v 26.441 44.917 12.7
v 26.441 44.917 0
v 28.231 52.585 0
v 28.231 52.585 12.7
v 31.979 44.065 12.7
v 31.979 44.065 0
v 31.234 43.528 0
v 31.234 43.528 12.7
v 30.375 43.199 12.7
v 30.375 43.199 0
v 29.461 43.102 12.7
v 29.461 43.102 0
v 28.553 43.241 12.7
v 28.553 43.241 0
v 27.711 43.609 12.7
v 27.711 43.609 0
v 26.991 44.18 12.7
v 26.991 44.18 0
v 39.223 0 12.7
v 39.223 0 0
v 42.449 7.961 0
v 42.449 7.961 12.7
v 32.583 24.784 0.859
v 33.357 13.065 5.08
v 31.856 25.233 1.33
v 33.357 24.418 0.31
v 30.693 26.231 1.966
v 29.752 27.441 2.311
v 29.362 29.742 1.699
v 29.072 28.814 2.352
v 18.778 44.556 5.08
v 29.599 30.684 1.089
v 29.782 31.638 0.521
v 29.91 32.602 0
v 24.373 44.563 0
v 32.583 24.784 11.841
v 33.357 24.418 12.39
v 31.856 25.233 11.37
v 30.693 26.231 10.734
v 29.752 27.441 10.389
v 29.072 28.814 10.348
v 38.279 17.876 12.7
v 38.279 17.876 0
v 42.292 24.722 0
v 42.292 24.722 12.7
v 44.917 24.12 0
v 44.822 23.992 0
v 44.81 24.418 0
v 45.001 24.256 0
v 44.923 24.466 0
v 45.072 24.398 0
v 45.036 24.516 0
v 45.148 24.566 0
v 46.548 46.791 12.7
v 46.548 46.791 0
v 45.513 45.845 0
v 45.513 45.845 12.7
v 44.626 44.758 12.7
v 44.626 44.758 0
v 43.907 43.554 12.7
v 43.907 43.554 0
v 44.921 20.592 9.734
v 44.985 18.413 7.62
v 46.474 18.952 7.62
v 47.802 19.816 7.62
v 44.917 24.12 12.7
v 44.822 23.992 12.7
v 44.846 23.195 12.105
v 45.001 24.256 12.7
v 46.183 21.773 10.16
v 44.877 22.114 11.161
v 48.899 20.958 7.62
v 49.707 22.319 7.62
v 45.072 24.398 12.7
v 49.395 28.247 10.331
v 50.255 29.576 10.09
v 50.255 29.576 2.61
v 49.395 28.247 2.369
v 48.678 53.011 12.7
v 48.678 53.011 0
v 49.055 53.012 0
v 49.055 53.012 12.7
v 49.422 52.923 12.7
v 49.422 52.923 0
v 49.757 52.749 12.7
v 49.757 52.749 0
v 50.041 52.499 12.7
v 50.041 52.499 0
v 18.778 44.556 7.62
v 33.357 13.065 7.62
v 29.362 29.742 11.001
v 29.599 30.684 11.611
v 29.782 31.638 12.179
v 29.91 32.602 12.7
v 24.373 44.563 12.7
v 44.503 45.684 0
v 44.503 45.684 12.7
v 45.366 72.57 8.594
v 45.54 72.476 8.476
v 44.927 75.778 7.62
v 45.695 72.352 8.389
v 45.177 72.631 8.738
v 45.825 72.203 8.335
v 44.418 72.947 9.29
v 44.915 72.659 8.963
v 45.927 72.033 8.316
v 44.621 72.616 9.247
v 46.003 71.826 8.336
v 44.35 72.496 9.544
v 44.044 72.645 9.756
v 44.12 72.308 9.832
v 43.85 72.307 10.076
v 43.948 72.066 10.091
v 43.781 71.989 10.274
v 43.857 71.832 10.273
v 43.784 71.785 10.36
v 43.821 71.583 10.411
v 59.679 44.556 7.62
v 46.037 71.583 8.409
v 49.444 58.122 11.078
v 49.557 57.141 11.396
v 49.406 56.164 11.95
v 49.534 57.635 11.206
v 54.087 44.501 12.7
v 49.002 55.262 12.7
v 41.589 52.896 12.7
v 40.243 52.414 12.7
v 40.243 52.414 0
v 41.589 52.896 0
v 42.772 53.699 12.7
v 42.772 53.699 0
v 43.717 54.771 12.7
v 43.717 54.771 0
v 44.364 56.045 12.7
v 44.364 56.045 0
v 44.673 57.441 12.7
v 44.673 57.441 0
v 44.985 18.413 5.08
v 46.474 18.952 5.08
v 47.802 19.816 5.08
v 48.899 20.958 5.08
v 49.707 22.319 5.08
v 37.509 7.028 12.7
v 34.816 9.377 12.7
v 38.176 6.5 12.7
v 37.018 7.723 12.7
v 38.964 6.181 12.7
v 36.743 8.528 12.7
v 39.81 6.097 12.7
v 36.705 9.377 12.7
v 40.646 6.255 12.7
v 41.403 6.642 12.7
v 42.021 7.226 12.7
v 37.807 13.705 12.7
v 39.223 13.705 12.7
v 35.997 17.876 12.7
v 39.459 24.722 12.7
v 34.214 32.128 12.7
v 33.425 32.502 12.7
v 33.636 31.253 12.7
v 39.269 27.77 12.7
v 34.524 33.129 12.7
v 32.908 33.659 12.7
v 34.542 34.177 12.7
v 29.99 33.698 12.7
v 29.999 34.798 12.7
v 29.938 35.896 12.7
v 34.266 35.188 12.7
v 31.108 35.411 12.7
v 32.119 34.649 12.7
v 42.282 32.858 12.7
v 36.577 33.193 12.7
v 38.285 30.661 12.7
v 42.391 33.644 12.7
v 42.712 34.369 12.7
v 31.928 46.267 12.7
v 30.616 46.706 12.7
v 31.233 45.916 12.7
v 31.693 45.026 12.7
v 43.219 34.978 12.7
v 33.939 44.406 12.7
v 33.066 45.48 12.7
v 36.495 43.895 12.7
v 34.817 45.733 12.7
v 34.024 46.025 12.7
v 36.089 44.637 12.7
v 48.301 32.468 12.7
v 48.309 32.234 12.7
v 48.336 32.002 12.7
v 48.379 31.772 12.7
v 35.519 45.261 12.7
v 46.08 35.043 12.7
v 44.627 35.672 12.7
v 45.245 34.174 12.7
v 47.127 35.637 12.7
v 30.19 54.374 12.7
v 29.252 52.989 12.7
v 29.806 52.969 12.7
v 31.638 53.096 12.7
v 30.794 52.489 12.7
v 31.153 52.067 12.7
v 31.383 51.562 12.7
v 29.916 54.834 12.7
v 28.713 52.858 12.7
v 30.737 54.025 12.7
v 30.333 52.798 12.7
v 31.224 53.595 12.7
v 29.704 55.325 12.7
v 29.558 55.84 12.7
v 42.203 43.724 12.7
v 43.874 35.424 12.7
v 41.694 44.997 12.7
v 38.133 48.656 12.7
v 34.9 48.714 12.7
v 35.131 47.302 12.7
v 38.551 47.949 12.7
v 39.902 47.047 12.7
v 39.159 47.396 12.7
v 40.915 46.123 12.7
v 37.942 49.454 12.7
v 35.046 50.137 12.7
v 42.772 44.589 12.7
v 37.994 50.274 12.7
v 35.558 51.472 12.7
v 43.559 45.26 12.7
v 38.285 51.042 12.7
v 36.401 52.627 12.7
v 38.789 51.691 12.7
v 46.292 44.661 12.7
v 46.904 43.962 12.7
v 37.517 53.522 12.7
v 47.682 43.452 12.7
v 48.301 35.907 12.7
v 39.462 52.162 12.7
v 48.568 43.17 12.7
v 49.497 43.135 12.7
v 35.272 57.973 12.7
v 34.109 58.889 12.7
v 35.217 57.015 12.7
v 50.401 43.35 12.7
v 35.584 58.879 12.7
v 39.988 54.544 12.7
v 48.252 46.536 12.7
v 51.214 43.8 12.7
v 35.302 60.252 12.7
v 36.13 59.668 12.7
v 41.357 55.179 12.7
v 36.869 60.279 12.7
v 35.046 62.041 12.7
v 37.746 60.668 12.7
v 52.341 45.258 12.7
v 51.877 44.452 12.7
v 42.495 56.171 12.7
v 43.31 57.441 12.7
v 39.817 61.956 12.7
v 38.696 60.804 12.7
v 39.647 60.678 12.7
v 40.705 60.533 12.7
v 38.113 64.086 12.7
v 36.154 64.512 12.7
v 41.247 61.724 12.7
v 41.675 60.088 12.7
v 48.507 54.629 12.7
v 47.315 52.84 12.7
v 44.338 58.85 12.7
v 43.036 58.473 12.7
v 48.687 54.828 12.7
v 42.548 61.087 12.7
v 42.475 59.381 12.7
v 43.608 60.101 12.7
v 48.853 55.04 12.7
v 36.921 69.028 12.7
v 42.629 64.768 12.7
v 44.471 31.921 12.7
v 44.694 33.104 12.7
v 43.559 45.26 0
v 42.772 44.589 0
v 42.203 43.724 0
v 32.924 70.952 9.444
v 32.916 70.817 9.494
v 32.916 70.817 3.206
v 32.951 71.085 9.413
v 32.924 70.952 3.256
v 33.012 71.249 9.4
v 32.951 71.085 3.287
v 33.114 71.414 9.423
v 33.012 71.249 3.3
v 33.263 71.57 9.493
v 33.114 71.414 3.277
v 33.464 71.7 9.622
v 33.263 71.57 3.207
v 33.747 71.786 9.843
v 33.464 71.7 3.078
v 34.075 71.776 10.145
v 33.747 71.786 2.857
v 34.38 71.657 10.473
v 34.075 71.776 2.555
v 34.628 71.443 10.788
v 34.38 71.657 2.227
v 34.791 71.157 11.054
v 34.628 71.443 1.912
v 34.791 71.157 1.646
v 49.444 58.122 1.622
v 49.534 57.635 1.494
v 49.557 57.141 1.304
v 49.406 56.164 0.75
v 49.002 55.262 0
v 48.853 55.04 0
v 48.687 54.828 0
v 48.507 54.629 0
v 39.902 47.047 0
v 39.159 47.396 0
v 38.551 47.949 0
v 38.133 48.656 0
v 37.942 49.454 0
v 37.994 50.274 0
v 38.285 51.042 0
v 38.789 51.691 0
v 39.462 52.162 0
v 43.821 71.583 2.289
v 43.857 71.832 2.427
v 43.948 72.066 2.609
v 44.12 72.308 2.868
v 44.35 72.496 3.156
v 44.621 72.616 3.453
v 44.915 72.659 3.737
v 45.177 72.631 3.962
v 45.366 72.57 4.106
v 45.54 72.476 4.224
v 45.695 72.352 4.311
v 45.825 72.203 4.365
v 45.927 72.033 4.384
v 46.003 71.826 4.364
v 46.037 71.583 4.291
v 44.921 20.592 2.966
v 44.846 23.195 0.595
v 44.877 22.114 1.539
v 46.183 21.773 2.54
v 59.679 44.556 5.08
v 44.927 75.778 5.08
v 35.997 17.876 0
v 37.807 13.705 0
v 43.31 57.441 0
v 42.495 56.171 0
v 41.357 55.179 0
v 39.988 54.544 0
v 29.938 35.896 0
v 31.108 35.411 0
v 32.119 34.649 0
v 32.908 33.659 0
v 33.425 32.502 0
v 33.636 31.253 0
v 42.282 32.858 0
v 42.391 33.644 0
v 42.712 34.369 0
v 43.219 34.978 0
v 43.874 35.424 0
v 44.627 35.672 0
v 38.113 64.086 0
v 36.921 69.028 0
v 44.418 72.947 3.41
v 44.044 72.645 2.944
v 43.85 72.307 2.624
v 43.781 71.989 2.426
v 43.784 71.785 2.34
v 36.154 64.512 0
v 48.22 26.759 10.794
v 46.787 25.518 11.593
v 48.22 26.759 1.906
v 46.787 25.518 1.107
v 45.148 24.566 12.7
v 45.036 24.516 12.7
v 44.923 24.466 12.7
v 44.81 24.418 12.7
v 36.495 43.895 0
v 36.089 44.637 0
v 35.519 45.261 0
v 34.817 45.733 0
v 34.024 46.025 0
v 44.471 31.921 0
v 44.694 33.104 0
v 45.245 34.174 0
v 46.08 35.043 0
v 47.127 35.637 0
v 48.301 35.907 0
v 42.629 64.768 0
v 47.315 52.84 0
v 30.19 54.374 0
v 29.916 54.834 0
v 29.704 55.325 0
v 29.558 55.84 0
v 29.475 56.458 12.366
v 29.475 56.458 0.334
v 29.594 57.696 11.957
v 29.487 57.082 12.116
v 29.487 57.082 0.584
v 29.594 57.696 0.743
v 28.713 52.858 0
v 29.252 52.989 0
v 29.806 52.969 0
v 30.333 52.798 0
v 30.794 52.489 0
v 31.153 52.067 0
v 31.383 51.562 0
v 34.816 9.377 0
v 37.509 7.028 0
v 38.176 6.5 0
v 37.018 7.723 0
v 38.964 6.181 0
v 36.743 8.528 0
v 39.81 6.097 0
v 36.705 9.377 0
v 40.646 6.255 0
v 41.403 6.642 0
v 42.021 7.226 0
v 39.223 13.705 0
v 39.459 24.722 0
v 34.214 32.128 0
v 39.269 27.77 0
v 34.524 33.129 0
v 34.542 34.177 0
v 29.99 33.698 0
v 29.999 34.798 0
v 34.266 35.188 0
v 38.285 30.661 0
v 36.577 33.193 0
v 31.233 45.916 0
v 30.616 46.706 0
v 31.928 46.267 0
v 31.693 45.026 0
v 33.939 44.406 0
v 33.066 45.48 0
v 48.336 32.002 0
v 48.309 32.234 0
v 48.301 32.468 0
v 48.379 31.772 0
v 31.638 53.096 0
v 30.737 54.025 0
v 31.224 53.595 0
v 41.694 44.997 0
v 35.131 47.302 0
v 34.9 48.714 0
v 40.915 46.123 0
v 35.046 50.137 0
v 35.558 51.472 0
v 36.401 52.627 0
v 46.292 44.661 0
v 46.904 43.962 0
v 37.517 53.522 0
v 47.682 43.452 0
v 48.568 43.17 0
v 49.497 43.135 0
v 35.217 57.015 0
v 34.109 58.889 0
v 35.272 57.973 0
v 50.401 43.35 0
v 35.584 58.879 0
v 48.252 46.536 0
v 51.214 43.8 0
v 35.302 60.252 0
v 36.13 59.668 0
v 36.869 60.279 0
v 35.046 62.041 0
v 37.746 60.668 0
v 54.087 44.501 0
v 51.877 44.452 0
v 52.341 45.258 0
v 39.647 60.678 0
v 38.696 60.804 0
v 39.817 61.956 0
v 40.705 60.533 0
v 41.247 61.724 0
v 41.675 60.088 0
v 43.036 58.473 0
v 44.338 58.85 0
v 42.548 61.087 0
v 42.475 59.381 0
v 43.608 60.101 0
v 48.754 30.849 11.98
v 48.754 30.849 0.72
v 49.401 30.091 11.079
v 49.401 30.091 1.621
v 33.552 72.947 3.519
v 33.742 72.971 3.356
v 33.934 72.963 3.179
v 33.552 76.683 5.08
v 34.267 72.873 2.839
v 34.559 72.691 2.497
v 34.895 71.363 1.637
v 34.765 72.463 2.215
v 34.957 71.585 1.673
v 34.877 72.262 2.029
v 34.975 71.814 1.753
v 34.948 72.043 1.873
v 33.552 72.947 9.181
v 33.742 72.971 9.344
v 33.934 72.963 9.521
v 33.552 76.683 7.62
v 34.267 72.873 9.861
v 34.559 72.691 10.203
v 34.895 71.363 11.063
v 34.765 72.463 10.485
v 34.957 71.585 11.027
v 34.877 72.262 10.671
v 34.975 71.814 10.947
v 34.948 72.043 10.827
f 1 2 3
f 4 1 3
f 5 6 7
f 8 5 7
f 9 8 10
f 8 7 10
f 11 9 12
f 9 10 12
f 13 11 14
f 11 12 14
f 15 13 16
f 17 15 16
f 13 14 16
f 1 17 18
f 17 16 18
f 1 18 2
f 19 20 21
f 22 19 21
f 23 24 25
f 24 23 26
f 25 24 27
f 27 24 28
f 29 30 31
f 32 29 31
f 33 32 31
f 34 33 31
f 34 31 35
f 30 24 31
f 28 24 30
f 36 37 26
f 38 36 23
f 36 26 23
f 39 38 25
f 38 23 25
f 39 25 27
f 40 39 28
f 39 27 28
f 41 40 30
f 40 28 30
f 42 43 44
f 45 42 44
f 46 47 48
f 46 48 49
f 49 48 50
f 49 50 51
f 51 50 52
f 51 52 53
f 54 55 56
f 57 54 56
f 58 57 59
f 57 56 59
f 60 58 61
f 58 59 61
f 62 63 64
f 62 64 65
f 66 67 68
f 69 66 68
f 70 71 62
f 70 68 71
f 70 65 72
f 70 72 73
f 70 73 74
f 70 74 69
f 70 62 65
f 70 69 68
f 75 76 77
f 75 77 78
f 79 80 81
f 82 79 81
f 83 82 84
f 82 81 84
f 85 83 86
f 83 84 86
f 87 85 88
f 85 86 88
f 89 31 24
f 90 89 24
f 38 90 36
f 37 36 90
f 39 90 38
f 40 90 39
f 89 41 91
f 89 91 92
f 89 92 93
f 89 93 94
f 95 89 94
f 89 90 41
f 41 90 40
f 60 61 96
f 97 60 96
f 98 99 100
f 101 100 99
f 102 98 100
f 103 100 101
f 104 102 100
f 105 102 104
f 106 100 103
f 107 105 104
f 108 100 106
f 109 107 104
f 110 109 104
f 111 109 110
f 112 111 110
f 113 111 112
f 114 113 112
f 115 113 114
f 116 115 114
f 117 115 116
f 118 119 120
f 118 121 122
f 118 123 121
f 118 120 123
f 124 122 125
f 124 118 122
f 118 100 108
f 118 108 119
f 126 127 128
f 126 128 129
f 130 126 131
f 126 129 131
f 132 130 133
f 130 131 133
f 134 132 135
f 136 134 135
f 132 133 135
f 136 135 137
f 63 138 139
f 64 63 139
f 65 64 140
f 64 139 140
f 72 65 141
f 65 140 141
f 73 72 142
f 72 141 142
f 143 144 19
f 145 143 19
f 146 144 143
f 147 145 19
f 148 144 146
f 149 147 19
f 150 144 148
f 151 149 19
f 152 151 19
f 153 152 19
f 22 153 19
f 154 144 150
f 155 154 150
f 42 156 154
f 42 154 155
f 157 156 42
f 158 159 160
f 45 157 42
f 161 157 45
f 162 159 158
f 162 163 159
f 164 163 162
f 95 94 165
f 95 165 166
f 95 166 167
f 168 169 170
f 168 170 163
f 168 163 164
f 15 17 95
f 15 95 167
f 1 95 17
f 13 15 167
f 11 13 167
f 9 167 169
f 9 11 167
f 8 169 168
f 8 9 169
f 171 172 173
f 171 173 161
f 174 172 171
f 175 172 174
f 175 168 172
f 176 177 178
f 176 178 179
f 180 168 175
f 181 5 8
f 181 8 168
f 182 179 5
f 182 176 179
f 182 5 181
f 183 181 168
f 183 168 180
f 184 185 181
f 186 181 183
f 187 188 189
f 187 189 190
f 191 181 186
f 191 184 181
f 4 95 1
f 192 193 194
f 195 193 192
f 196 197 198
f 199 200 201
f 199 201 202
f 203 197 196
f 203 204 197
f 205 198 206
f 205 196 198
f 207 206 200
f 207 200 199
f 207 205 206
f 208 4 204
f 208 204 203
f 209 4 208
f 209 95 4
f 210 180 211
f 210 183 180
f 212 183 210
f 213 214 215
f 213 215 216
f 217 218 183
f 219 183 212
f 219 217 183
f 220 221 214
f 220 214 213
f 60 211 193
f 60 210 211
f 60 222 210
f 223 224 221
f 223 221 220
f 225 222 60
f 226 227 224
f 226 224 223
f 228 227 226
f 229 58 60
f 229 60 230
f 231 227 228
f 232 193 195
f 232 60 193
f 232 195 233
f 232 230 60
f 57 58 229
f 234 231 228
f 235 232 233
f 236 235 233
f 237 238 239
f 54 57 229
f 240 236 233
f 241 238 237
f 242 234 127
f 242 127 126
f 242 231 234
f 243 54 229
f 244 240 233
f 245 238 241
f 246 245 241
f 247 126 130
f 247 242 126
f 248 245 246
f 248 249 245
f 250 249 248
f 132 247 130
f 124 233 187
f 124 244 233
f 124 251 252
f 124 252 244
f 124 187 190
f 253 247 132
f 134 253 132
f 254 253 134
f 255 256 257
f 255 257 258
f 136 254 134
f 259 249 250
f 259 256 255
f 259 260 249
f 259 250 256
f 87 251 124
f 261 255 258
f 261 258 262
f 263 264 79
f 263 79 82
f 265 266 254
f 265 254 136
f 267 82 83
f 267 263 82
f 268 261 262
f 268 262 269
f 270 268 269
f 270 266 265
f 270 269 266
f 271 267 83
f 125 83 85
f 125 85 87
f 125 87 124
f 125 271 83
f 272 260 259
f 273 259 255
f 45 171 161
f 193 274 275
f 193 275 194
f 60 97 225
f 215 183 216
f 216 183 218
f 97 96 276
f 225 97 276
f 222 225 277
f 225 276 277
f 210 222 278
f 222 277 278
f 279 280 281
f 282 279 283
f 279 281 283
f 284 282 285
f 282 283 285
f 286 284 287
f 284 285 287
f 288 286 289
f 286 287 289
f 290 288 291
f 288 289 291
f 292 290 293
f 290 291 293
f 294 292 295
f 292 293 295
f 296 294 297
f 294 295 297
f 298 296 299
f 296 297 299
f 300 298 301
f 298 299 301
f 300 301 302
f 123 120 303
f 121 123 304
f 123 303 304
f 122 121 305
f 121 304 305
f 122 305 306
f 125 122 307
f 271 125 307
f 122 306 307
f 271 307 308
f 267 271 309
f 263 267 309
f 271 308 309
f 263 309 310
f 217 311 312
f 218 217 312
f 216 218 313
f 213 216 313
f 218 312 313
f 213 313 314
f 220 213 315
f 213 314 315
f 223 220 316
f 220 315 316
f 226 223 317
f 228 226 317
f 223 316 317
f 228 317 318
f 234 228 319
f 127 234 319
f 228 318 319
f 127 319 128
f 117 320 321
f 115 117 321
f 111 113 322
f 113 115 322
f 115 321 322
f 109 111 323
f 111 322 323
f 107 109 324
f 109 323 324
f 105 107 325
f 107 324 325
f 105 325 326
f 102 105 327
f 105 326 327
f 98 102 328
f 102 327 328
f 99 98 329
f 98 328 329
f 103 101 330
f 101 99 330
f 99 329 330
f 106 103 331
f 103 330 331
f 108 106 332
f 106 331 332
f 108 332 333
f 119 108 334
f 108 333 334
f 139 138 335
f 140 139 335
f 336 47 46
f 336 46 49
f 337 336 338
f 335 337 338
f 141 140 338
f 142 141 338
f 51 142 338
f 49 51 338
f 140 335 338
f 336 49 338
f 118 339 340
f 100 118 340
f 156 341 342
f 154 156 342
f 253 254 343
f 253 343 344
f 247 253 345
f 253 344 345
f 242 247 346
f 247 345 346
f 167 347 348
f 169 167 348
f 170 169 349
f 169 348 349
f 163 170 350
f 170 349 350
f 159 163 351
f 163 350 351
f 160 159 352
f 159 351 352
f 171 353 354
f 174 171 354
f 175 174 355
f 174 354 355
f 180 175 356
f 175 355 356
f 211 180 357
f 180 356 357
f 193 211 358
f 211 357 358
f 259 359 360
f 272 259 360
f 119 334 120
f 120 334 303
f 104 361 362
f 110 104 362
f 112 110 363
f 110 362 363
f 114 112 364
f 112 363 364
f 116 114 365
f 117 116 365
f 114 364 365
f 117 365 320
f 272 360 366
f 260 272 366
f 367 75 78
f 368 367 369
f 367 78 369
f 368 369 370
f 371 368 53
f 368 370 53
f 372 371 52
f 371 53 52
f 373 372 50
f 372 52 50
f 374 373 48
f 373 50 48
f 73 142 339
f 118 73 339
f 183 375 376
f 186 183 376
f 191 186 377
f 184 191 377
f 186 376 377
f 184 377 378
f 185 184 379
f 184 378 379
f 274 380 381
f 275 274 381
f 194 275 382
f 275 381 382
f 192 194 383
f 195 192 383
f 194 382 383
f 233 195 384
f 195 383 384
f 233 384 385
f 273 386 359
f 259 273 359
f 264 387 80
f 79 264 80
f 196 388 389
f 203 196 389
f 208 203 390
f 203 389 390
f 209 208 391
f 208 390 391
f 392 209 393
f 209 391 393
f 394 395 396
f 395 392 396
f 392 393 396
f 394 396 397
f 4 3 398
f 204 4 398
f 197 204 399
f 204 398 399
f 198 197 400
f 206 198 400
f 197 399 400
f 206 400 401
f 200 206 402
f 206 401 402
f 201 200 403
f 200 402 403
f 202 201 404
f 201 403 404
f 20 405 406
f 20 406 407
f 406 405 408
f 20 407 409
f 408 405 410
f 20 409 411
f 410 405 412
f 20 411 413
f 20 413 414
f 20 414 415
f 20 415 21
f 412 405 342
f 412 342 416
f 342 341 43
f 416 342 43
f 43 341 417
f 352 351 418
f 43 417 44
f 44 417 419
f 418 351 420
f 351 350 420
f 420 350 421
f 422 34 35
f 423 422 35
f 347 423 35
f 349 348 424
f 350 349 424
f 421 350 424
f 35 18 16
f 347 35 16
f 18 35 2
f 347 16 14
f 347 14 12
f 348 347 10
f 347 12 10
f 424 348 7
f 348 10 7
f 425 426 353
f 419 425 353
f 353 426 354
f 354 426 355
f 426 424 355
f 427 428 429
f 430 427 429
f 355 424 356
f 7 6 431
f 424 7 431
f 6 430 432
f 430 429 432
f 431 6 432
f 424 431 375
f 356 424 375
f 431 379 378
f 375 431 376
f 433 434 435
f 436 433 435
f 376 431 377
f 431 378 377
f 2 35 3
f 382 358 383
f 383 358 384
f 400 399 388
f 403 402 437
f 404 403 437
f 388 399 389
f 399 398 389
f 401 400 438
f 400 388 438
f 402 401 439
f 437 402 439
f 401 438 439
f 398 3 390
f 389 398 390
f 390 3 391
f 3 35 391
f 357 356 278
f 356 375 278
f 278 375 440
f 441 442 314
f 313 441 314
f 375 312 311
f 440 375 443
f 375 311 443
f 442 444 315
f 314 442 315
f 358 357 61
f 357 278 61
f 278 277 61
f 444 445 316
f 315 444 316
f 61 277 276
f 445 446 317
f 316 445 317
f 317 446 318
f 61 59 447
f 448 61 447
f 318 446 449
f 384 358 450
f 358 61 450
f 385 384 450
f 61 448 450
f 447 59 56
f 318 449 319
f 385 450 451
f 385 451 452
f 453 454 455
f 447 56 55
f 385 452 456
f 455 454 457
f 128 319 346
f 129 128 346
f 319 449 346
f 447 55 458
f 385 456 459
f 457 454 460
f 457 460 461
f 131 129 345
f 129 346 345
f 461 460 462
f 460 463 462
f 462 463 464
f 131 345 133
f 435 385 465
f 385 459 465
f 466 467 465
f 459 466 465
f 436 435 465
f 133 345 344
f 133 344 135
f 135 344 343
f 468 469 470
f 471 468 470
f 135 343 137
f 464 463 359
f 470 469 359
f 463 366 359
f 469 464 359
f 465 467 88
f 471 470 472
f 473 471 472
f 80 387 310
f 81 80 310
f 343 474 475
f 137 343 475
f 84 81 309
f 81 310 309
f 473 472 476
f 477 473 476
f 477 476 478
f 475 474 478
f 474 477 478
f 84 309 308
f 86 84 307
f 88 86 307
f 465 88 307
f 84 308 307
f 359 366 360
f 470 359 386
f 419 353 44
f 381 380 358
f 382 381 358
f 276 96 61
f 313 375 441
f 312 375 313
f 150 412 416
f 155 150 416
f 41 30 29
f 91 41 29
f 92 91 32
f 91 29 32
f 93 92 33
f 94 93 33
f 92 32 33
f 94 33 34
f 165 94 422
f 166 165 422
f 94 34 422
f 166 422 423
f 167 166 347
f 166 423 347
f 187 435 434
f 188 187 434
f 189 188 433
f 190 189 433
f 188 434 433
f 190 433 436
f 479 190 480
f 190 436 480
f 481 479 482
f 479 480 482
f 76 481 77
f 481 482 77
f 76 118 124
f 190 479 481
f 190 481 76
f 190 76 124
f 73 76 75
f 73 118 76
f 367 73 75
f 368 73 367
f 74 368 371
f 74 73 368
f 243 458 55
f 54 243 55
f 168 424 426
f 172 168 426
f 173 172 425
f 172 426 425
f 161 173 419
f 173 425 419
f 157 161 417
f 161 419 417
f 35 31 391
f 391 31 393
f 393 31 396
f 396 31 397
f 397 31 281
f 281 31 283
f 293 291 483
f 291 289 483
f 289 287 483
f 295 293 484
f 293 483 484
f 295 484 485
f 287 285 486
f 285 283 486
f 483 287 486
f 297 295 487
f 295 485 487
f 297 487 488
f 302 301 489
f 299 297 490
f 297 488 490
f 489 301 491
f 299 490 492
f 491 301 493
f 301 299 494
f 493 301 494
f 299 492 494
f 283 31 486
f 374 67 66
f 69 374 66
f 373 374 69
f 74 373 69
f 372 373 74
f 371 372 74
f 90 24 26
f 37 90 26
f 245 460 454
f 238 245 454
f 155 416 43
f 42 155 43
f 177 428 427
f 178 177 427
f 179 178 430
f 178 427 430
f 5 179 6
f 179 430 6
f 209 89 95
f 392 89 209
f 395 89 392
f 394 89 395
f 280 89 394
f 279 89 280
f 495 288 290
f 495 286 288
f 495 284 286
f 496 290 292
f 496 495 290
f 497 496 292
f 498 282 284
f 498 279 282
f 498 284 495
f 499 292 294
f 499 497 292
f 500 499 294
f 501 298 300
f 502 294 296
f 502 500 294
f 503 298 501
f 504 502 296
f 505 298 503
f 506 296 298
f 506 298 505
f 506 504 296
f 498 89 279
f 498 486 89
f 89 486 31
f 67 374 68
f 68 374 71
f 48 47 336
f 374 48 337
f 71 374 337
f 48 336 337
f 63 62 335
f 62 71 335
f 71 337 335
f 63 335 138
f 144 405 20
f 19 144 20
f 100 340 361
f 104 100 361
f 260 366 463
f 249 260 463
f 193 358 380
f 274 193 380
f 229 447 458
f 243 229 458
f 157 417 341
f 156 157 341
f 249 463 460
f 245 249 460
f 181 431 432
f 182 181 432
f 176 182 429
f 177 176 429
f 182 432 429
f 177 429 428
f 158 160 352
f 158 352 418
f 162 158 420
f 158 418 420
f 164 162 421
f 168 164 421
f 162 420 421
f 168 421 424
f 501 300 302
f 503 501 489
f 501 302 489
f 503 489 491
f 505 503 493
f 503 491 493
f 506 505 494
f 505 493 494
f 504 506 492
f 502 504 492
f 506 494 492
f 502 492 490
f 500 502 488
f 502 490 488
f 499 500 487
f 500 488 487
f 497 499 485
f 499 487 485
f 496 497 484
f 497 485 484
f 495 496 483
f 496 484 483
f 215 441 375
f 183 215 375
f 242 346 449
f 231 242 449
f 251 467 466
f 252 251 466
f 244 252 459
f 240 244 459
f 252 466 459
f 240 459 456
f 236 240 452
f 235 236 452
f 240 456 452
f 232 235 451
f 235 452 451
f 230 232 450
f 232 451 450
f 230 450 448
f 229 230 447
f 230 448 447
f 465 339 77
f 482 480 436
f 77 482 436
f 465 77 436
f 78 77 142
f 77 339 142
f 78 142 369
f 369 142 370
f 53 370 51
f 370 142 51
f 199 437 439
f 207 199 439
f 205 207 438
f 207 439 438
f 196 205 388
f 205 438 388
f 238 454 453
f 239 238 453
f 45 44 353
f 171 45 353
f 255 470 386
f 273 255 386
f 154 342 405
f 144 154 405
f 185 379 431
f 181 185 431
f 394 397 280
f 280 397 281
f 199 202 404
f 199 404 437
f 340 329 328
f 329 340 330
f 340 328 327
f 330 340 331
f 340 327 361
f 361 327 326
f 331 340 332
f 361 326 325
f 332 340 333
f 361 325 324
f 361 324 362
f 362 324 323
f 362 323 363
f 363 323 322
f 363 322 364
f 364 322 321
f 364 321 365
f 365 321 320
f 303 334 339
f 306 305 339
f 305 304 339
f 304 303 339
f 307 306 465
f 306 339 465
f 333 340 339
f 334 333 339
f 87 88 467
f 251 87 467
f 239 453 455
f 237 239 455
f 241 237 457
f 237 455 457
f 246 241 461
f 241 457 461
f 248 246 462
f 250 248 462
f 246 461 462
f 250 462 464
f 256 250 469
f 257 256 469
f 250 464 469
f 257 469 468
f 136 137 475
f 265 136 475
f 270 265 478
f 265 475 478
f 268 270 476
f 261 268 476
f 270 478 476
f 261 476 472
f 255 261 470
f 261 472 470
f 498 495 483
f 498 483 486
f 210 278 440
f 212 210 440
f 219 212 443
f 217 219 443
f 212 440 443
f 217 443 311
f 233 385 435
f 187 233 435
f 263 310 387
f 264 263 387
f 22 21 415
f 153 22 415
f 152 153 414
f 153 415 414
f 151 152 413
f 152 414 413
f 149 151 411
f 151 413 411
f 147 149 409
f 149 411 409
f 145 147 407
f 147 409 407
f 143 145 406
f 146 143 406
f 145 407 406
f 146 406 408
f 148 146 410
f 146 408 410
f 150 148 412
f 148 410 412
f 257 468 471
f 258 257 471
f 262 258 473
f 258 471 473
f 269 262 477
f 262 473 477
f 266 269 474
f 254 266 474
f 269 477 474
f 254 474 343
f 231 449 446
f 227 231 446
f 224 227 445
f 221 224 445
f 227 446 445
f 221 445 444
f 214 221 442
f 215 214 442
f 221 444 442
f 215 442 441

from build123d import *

# Parameters (mm, degrees)
F1_DEPTH     = 12.7
F2_T1_DEPTH  = 61.4894192219
F2_T3_DEPTH  = 60.6595144669
F2_T5_DEPTH  = 37.4346345762
F2_T10_DEPTH = 60.8311166964
F2_T15_ANGLE = 160.5521212616
F2_T20_DEPTH = 60.8311166964
F2_T25_ANGLE = 160.5521212616


# Not quite as in the source:
# - a fillet or chamfer that OpenCascade refuses, or shapes differently, is made with other operations: its cross-section is extruded or revolved along the edge and cut away or added


with BuildPart() as f1:
    # F0 (on Top) → F1 (new body)
    with BuildSketch(Plane.XY):
        with BuildLine():
            Line((38.2788181305, 17.8758297116), (42.2920919955, 24.7220024467))
            Line((42.2920919955, 24.7220024467), (42.2820188105, 32.8584946692))
            ThreePointArc((42.2820188105, 32.8584946692), (42.9440997072, 34.690736549), (44.6269139647, 35.6723666191))
            Line((44.6269139647, 35.6723666191), (44.4705858827, 31.9205336273))
            ThreePointArc((44.4705858827, 31.9205336273), (45.6310728705, 34.6386150419), (48.3005791903, 35.9068550169))
            Line((48.3005791903, 35.9068550169), (48.3005791903, 32.4676781893))
            ThreePointArc((48.3005791903, 32.4676781893), (48.8348924642, 30.7225209157), (50.2546578646, 29.5756421983))
            Line((50.2546578646, 29.5756421983), (49.394864589, 28.2468684018))
            ThreePointArc((49.394864589, 28.2468684018), (47.3924953639, 25.9852736124), (44.8100380599, 24.4183633476))
            Line((44.8100380599, 24.4183633476), (44.98494789, 18.4131488204))
            ThreePointArc((44.98494789, 18.4131488204), (47.8016399203, 19.8157230834), (49.7074984014, 22.3194546998))
            Line((49.7074984014, 22.3194546998), (59.6794784069, 44.5563644171))
            Line((59.6794784069, 44.5563644171), (44.9269972742, 75.77765733))
            Line((44.9269972742, 75.77765733), (44.417835772, 72.9466155171))
            ThreePointArc((44.417835772, 72.9466155171), (43.8763497816, 72.371486937), (43.8214614987, 71.5834721923))
            ThreePointArc((43.8214614987, 71.5834721923), (44.9290145189, 72.6595413512), (46.036567539, 71.5834721923))
            Line((46.036567539, 71.5834721923), (49.4444258511, 58.1224299967))
            ThreePointArc((49.4444258511, 58.1224299967), (49.4311906391, 56.2537383436), (48.5072657466, 54.6293780208))
            Line((48.5072657466, 54.6293780208), (47.3145134747, 52.8402514756))
            Line((47.3145134747, 52.8402514756), (48.6776567996, 53.0106425285))
            ThreePointArc((48.6776567996, 53.0106425285), (49.4221984033, 52.9229745419), (50.0408001244, 52.4994656444))
            Line((50.0408001244, 52.4994656444), (52.3411072791, 45.2577620745))
            ThreePointArc((52.3411072791, 45.2577620745), (49.496534757, 43.1348395296), (46.2921559811, 44.6613878012))
            Line((46.2921559811, 44.6613878012), (48.2516773045, 46.5357117355))
            Line((48.2516773045, 46.5357117355), (46.5477481484, 46.7913001776))
            ThreePointArc((46.5477481484, 46.7913001776), (45.0495064909, 45.3175304922), (43.9066551626, 43.5538366437))
            Line((43.9066551626, 43.5538366437), (44.5030331612, 45.6837452948))
            ThreePointArc((44.5030331612, 45.6837452948), (43.1415749719, 44.952040155), (42.2027260065, 43.7242276967))
            ThreePointArc((42.2027260065, 43.7242276967), (41.3363207449, 45.5819979858), (39.9024225771, 47.0468886197))
            ThreePointArc((39.9024225771, 47.0468886197), (37.9368947907, 49.8661923797), (40.2432084084, 52.4142682552))
            ThreePointArc((40.2432084084, 52.4142682552), (43.2781651475, 54.2049845256), (44.6734242141, 57.4408583343))
            ThreePointArc((44.6734242141, 57.4408583343), (43.1144375969, 60.6332712401), (39.817225188, 61.9562715292))
            Line((39.817225188, 61.9562715292), (42.6287092268, 64.767755568))
            Line((42.6287092268, 64.767755568), (38.113296032, 64.0861839056))
            Line((38.113296032, 64.0861839056), (36.9205437601, 69.0275803208))
            Line((36.9205437601, 69.0275803208), (36.1537747085, 64.5121708512))
            Line((36.1537747085, 64.5121708512), (35.046223551, 62.0414689183))
            Line((35.046223551, 62.0414689183), (35.3018119931, 60.2523423731))
            Line((35.3018119931, 60.2523423731), (34.1090597212, 58.8891990483))
            Line((34.1090597212, 58.8891990483), (35.216614604, 57.0148788393))
            ThreePointArc((35.216614604, 57.0148788393), (36.4787140011, 59.9990779117), (39.6468304098, 60.6783255935))
            ThreePointArc((39.6468304098, 60.6783255935), (42.100861171, 59.7637799228), (43.3102808893, 57.4408583343))
            ThreePointArc((43.3102808893, 57.4408583343), (41.960859951, 55.6347382447), (39.987616241, 54.5441806316))
            Line((39.987616241, 54.5441806316), (37.5169217587, 53.521823138))
            ThreePointArc((37.5169217587, 53.521823138), (35.2577529504, 50.8211890197), (35.1314172149, 47.302480787))
            Line((35.1314172149, 47.302480787), (36.494564265, 43.8946224749))
            ThreePointArc((36.494564265, 43.8946224749), (35.5191674638, 45.2611219807), (34.0238660574, 46.024531126))
            Line((34.0238660574, 46.024531126), (33.9386686683, 44.4057993591))
            ThreePointArc((33.9386686683, 44.4057993591), (32.5250680188, 45.9137846149), (30.6160058826, 46.7061027884))
            ThreePointArc((30.6160058826, 46.7061027884), (31.4840333326, 45.4817930881), (31.9791510701, 44.0650135279))
            ThreePointArc((31.9791510701, 44.0650135279), (29.0027298162, 43.1420138964), (26.4413785189, 44.9169762433))
            Line((26.4413785189, 44.9169762433), (28.2305050641, 52.5846593082))
            ThreePointArc((28.2305050641, 52.5846593082), (30.0752112346, 52.9015778311), (31.3827730715, 51.5623018146))
            Line((31.3827730715, 51.5623018146), (31.6383615136, 53.0958399177))
            ThreePointArc((31.6383615136, 53.0958399177), (30.9888271445, 53.8193992901), (30.1900226623, 54.3737858534))
            ThreePointArc((30.1900226623, 54.3737858534), (29.5328449453, 55.9706841256), (29.593648389, 57.6964505017))
            Line((29.593648389, 57.6964505017), (32.9163111746, 70.8167105913))
            ThreePointArc((32.9163111746, 70.8167105913), (33.7093855935, 71.7795807909), (34.7906313837, 71.1574926972))
            ThreePointArc((34.7906313837, 71.1574926972), (34.7651749092, 72.4631986698), (33.5519872606, 72.9466155171))
            Line((33.5519872606, 72.9466155171), (33.5519872606, 76.6831859946))
            Line((33.5519872606, 76.6831859946), (18.7778156251, 44.5563644171))
            Line((18.7778156251, 44.5563644171), (33.3570353687, 13.0645893514))
            Line((33.3570353687, 13.0645893514), (33.3570353687, 24.4183633476))
            ThreePointArc((33.3570353687, 24.4183633476), (30.754145435, 26.167413579), (29.0718954057, 28.8139674813))
            ThreePointArc((29.0718954057, 28.8139674813), (29.8771193905, 32.3095735456), (29.9375038594, 35.8962155879))
            ThreePointArc((29.9375038594, 35.8962155879), (32.545088234, 34.1789060872), (33.6360111833, 31.2534086406))
            ThreePointArc((33.6360111833, 31.2534086406), (34.5240159071, 33.128980926), (34.2655442655, 35.1879894733))
            ThreePointArc((34.2655442655, 35.1879894733), (38.2849845666, 30.6609560826), (39.4591912627, 24.7220024467))
            Line((39.4591912627, 24.7220024467), (35.996761173, 17.8758297116))
            Line((35.996761173, 17.8758297116), (37.8066673875, 13.705172576))
            Line((37.8066673875, 13.705172576), (34.8163843155, 9.3771321699))
            Line((34.8163843155, 9.3771321699), (39.2231196165, 0))
            Line((39.2231196165, 0), (42.4494743347, 7.9606827348))
            ThreePointArc((42.4494743347, 7.9606827348), (38.9638620653, 6.181357436), (36.7049872875, 9.3771321699))
            Line((36.7049872875, 9.3771321699), (39.2231196165, 13.705172576))
            Line((39.2231196165, 13.705172576), (38.2788181305, 17.8758297116))
        make_face()
    extrude(amount=F1_DEPTH)

    # F2: chamfer of 5.08 on 10 edges, made by hand

    # F2_s2 → F2_t1 (cut)
    with BuildSketch(Plane(origin=(40.423720467, 87.9024345312, 0), x_dir=(0, 0, 1), z_dir=(-0.4178083615, -0.9085351799, 0))):
        Polygon((7.62, 1.5557155161), (12.7, -3.5242844839), (12.7, 1.5557155161), align=None)
        Polygon((5.08, 1.5557155161), (0, -3.5242844839), (0, 1.5557155161), align=None)
    extrude(amount=F2_T1_DEPTH, mode=Mode.SUBTRACT)

    # F2_s4 → F2_t3 (cut)
    with BuildSketch(Plane(origin=(-0.736952526, 1.5596434572, 0), x_dir=(0, 0, 1), z_dir=(-0.4272216023, 0.9041469474, 0))):
        Polygon((7.62, 72.9944596236), (12.7, 67.9144596236), (12.7, 72.9944596236), align=None)
        Polygon((5.08, 72.9944596236), (0, 67.9144596236), (0, 72.9944596236), align=None)
    extrude(amount=F2_T3_DEPTH, mode=Mode.SUBTRACT)

    # F2_s6 → F2_t5 (cut)
    with BuildSketch(Plane(origin=(16.6557348467, 37.141277044, 0), x_dir=(0, 0, 1), z_dir=(0.4091826653, 0.91245249, 0))):
        Polygon((7.62, 36.2229967242), (12.7, 31.1429967242), (12.7, 36.2229967242), align=None)
        Polygon((5.08, 36.2229967242), (0, 31.1429967242), (0, 36.2229967242), align=None)
    extrude(amount=F2_T5_DEPTH, mode=Mode.SUBTRACT)


with BuildPart() as f2_tool8:
    # F2_s9 → F2_t10 (new body)
    with BuildSketch(Plane(origin=(-19.1610255807, 41.3886832236, 0), x_dir=(0, 0, 1), z_dir=(0.4201163127, -0.9074702661, 0))):
        Polygon((7.62, -35.7591648667), (12.7, -40.8391648667), (12.7, -35.7591648667), align=None)
    extrude(amount=F2_T10_DEPTH)

    split(bisect_by=Plane(origin=(21.465639244, -10.8561787862, 0), x_dir=(0, 0, 1), z_dir=(-0.8923664741, 0.4513115065, 0)), keep=Keep.TOP)


with BuildPart() as f1_1:
    add(f1.part)

    # F2_t7: cut F2_tool8
    add(f2_tool8.part, mode=Mode.SUBTRACT)


with BuildPart() as f2_tool13:
    # F2_s14 → F2_t15 (revolve)
    with BuildSketch(Plane(origin=(2.3486048787, 28.532346778, 0), x_dir=(0, 0, 1), z_dir=(0.0820363131, 0.996629341, 0))):
        Polygon((7.62, 34.2474692794), (12.7, 39.3274692794), (12.7, 34.2474692794), align=None)
    revolve(axis=Axis((43.3856729768, 25.154431211, 12.7), (0, 0, 1)), revolution_arc=F2_T15_ANGLE)

    split(bisect_by=Plane(origin=(45.4826703508, 1.3247430391, 0), x_dir=(0, 0, 1), z_dir=(0.9995760983, 0.0291139783, 0)), keep=Keep.TOP)


with BuildPart() as f1_2:
    add(f1_1.part)

    # F2_t12: cut F2_tool13
    add(f2_tool13.part, mode=Mode.SUBTRACT)


with BuildPart() as f2_tool18:
    # F2_s19 → F2_t20 (new body)
    with BuildSketch(Plane(origin=(-19.1610255807, 41.3886832236, 0), x_dir=(0, 0, 1), z_dir=(0.4201163127, -0.9074702661, 0))):
        Polygon((5.08, -35.7591648667), (0, -40.8391648667), (0, -35.7591648667), align=None)
    extrude(amount=F2_T20_DEPTH)

    split(bisect_by=Plane(origin=(21.465639244, -10.8561787862, 0), x_dir=(0, 0, 1), z_dir=(-0.8923664741, 0.4513115065, 0)), keep=Keep.TOP)


with BuildPart() as f1_3:
    add(f1_2.part)

    # F2_t17: cut F2_tool18
    add(f2_tool18.part, mode=Mode.SUBTRACT)


with BuildPart() as f2_tool23:
    # F2_s24 → F2_t25 (revolve)
    with BuildSketch(Plane(origin=(2.3486048787, 28.532346778, 0), x_dir=(0, 0, 1), z_dir=(0.0820363131, 0.996629341, 0))):
        Polygon((5.08, 34.2474692794), (0, 39.3274692794), (0, 34.2474692794), align=None)
    revolve(axis=Axis((43.3856729768, 25.154431211, 0), (0, 0, 1)), revolution_arc=F2_T25_ANGLE)

    split(bisect_by=Plane(origin=(45.4826703508, 1.3247430391, 0), x_dir=(0, 0, 1), z_dir=(0.9995760983, 0.0291139783, 0)), keep=Keep.TOP)


with BuildPart() as f1_4:
    add(f1_3.part)

    # F2_t22: cut F2_tool23
    add(f2_tool23.part, mode=Mode.SUBTRACT)


solid = f1_4.part
